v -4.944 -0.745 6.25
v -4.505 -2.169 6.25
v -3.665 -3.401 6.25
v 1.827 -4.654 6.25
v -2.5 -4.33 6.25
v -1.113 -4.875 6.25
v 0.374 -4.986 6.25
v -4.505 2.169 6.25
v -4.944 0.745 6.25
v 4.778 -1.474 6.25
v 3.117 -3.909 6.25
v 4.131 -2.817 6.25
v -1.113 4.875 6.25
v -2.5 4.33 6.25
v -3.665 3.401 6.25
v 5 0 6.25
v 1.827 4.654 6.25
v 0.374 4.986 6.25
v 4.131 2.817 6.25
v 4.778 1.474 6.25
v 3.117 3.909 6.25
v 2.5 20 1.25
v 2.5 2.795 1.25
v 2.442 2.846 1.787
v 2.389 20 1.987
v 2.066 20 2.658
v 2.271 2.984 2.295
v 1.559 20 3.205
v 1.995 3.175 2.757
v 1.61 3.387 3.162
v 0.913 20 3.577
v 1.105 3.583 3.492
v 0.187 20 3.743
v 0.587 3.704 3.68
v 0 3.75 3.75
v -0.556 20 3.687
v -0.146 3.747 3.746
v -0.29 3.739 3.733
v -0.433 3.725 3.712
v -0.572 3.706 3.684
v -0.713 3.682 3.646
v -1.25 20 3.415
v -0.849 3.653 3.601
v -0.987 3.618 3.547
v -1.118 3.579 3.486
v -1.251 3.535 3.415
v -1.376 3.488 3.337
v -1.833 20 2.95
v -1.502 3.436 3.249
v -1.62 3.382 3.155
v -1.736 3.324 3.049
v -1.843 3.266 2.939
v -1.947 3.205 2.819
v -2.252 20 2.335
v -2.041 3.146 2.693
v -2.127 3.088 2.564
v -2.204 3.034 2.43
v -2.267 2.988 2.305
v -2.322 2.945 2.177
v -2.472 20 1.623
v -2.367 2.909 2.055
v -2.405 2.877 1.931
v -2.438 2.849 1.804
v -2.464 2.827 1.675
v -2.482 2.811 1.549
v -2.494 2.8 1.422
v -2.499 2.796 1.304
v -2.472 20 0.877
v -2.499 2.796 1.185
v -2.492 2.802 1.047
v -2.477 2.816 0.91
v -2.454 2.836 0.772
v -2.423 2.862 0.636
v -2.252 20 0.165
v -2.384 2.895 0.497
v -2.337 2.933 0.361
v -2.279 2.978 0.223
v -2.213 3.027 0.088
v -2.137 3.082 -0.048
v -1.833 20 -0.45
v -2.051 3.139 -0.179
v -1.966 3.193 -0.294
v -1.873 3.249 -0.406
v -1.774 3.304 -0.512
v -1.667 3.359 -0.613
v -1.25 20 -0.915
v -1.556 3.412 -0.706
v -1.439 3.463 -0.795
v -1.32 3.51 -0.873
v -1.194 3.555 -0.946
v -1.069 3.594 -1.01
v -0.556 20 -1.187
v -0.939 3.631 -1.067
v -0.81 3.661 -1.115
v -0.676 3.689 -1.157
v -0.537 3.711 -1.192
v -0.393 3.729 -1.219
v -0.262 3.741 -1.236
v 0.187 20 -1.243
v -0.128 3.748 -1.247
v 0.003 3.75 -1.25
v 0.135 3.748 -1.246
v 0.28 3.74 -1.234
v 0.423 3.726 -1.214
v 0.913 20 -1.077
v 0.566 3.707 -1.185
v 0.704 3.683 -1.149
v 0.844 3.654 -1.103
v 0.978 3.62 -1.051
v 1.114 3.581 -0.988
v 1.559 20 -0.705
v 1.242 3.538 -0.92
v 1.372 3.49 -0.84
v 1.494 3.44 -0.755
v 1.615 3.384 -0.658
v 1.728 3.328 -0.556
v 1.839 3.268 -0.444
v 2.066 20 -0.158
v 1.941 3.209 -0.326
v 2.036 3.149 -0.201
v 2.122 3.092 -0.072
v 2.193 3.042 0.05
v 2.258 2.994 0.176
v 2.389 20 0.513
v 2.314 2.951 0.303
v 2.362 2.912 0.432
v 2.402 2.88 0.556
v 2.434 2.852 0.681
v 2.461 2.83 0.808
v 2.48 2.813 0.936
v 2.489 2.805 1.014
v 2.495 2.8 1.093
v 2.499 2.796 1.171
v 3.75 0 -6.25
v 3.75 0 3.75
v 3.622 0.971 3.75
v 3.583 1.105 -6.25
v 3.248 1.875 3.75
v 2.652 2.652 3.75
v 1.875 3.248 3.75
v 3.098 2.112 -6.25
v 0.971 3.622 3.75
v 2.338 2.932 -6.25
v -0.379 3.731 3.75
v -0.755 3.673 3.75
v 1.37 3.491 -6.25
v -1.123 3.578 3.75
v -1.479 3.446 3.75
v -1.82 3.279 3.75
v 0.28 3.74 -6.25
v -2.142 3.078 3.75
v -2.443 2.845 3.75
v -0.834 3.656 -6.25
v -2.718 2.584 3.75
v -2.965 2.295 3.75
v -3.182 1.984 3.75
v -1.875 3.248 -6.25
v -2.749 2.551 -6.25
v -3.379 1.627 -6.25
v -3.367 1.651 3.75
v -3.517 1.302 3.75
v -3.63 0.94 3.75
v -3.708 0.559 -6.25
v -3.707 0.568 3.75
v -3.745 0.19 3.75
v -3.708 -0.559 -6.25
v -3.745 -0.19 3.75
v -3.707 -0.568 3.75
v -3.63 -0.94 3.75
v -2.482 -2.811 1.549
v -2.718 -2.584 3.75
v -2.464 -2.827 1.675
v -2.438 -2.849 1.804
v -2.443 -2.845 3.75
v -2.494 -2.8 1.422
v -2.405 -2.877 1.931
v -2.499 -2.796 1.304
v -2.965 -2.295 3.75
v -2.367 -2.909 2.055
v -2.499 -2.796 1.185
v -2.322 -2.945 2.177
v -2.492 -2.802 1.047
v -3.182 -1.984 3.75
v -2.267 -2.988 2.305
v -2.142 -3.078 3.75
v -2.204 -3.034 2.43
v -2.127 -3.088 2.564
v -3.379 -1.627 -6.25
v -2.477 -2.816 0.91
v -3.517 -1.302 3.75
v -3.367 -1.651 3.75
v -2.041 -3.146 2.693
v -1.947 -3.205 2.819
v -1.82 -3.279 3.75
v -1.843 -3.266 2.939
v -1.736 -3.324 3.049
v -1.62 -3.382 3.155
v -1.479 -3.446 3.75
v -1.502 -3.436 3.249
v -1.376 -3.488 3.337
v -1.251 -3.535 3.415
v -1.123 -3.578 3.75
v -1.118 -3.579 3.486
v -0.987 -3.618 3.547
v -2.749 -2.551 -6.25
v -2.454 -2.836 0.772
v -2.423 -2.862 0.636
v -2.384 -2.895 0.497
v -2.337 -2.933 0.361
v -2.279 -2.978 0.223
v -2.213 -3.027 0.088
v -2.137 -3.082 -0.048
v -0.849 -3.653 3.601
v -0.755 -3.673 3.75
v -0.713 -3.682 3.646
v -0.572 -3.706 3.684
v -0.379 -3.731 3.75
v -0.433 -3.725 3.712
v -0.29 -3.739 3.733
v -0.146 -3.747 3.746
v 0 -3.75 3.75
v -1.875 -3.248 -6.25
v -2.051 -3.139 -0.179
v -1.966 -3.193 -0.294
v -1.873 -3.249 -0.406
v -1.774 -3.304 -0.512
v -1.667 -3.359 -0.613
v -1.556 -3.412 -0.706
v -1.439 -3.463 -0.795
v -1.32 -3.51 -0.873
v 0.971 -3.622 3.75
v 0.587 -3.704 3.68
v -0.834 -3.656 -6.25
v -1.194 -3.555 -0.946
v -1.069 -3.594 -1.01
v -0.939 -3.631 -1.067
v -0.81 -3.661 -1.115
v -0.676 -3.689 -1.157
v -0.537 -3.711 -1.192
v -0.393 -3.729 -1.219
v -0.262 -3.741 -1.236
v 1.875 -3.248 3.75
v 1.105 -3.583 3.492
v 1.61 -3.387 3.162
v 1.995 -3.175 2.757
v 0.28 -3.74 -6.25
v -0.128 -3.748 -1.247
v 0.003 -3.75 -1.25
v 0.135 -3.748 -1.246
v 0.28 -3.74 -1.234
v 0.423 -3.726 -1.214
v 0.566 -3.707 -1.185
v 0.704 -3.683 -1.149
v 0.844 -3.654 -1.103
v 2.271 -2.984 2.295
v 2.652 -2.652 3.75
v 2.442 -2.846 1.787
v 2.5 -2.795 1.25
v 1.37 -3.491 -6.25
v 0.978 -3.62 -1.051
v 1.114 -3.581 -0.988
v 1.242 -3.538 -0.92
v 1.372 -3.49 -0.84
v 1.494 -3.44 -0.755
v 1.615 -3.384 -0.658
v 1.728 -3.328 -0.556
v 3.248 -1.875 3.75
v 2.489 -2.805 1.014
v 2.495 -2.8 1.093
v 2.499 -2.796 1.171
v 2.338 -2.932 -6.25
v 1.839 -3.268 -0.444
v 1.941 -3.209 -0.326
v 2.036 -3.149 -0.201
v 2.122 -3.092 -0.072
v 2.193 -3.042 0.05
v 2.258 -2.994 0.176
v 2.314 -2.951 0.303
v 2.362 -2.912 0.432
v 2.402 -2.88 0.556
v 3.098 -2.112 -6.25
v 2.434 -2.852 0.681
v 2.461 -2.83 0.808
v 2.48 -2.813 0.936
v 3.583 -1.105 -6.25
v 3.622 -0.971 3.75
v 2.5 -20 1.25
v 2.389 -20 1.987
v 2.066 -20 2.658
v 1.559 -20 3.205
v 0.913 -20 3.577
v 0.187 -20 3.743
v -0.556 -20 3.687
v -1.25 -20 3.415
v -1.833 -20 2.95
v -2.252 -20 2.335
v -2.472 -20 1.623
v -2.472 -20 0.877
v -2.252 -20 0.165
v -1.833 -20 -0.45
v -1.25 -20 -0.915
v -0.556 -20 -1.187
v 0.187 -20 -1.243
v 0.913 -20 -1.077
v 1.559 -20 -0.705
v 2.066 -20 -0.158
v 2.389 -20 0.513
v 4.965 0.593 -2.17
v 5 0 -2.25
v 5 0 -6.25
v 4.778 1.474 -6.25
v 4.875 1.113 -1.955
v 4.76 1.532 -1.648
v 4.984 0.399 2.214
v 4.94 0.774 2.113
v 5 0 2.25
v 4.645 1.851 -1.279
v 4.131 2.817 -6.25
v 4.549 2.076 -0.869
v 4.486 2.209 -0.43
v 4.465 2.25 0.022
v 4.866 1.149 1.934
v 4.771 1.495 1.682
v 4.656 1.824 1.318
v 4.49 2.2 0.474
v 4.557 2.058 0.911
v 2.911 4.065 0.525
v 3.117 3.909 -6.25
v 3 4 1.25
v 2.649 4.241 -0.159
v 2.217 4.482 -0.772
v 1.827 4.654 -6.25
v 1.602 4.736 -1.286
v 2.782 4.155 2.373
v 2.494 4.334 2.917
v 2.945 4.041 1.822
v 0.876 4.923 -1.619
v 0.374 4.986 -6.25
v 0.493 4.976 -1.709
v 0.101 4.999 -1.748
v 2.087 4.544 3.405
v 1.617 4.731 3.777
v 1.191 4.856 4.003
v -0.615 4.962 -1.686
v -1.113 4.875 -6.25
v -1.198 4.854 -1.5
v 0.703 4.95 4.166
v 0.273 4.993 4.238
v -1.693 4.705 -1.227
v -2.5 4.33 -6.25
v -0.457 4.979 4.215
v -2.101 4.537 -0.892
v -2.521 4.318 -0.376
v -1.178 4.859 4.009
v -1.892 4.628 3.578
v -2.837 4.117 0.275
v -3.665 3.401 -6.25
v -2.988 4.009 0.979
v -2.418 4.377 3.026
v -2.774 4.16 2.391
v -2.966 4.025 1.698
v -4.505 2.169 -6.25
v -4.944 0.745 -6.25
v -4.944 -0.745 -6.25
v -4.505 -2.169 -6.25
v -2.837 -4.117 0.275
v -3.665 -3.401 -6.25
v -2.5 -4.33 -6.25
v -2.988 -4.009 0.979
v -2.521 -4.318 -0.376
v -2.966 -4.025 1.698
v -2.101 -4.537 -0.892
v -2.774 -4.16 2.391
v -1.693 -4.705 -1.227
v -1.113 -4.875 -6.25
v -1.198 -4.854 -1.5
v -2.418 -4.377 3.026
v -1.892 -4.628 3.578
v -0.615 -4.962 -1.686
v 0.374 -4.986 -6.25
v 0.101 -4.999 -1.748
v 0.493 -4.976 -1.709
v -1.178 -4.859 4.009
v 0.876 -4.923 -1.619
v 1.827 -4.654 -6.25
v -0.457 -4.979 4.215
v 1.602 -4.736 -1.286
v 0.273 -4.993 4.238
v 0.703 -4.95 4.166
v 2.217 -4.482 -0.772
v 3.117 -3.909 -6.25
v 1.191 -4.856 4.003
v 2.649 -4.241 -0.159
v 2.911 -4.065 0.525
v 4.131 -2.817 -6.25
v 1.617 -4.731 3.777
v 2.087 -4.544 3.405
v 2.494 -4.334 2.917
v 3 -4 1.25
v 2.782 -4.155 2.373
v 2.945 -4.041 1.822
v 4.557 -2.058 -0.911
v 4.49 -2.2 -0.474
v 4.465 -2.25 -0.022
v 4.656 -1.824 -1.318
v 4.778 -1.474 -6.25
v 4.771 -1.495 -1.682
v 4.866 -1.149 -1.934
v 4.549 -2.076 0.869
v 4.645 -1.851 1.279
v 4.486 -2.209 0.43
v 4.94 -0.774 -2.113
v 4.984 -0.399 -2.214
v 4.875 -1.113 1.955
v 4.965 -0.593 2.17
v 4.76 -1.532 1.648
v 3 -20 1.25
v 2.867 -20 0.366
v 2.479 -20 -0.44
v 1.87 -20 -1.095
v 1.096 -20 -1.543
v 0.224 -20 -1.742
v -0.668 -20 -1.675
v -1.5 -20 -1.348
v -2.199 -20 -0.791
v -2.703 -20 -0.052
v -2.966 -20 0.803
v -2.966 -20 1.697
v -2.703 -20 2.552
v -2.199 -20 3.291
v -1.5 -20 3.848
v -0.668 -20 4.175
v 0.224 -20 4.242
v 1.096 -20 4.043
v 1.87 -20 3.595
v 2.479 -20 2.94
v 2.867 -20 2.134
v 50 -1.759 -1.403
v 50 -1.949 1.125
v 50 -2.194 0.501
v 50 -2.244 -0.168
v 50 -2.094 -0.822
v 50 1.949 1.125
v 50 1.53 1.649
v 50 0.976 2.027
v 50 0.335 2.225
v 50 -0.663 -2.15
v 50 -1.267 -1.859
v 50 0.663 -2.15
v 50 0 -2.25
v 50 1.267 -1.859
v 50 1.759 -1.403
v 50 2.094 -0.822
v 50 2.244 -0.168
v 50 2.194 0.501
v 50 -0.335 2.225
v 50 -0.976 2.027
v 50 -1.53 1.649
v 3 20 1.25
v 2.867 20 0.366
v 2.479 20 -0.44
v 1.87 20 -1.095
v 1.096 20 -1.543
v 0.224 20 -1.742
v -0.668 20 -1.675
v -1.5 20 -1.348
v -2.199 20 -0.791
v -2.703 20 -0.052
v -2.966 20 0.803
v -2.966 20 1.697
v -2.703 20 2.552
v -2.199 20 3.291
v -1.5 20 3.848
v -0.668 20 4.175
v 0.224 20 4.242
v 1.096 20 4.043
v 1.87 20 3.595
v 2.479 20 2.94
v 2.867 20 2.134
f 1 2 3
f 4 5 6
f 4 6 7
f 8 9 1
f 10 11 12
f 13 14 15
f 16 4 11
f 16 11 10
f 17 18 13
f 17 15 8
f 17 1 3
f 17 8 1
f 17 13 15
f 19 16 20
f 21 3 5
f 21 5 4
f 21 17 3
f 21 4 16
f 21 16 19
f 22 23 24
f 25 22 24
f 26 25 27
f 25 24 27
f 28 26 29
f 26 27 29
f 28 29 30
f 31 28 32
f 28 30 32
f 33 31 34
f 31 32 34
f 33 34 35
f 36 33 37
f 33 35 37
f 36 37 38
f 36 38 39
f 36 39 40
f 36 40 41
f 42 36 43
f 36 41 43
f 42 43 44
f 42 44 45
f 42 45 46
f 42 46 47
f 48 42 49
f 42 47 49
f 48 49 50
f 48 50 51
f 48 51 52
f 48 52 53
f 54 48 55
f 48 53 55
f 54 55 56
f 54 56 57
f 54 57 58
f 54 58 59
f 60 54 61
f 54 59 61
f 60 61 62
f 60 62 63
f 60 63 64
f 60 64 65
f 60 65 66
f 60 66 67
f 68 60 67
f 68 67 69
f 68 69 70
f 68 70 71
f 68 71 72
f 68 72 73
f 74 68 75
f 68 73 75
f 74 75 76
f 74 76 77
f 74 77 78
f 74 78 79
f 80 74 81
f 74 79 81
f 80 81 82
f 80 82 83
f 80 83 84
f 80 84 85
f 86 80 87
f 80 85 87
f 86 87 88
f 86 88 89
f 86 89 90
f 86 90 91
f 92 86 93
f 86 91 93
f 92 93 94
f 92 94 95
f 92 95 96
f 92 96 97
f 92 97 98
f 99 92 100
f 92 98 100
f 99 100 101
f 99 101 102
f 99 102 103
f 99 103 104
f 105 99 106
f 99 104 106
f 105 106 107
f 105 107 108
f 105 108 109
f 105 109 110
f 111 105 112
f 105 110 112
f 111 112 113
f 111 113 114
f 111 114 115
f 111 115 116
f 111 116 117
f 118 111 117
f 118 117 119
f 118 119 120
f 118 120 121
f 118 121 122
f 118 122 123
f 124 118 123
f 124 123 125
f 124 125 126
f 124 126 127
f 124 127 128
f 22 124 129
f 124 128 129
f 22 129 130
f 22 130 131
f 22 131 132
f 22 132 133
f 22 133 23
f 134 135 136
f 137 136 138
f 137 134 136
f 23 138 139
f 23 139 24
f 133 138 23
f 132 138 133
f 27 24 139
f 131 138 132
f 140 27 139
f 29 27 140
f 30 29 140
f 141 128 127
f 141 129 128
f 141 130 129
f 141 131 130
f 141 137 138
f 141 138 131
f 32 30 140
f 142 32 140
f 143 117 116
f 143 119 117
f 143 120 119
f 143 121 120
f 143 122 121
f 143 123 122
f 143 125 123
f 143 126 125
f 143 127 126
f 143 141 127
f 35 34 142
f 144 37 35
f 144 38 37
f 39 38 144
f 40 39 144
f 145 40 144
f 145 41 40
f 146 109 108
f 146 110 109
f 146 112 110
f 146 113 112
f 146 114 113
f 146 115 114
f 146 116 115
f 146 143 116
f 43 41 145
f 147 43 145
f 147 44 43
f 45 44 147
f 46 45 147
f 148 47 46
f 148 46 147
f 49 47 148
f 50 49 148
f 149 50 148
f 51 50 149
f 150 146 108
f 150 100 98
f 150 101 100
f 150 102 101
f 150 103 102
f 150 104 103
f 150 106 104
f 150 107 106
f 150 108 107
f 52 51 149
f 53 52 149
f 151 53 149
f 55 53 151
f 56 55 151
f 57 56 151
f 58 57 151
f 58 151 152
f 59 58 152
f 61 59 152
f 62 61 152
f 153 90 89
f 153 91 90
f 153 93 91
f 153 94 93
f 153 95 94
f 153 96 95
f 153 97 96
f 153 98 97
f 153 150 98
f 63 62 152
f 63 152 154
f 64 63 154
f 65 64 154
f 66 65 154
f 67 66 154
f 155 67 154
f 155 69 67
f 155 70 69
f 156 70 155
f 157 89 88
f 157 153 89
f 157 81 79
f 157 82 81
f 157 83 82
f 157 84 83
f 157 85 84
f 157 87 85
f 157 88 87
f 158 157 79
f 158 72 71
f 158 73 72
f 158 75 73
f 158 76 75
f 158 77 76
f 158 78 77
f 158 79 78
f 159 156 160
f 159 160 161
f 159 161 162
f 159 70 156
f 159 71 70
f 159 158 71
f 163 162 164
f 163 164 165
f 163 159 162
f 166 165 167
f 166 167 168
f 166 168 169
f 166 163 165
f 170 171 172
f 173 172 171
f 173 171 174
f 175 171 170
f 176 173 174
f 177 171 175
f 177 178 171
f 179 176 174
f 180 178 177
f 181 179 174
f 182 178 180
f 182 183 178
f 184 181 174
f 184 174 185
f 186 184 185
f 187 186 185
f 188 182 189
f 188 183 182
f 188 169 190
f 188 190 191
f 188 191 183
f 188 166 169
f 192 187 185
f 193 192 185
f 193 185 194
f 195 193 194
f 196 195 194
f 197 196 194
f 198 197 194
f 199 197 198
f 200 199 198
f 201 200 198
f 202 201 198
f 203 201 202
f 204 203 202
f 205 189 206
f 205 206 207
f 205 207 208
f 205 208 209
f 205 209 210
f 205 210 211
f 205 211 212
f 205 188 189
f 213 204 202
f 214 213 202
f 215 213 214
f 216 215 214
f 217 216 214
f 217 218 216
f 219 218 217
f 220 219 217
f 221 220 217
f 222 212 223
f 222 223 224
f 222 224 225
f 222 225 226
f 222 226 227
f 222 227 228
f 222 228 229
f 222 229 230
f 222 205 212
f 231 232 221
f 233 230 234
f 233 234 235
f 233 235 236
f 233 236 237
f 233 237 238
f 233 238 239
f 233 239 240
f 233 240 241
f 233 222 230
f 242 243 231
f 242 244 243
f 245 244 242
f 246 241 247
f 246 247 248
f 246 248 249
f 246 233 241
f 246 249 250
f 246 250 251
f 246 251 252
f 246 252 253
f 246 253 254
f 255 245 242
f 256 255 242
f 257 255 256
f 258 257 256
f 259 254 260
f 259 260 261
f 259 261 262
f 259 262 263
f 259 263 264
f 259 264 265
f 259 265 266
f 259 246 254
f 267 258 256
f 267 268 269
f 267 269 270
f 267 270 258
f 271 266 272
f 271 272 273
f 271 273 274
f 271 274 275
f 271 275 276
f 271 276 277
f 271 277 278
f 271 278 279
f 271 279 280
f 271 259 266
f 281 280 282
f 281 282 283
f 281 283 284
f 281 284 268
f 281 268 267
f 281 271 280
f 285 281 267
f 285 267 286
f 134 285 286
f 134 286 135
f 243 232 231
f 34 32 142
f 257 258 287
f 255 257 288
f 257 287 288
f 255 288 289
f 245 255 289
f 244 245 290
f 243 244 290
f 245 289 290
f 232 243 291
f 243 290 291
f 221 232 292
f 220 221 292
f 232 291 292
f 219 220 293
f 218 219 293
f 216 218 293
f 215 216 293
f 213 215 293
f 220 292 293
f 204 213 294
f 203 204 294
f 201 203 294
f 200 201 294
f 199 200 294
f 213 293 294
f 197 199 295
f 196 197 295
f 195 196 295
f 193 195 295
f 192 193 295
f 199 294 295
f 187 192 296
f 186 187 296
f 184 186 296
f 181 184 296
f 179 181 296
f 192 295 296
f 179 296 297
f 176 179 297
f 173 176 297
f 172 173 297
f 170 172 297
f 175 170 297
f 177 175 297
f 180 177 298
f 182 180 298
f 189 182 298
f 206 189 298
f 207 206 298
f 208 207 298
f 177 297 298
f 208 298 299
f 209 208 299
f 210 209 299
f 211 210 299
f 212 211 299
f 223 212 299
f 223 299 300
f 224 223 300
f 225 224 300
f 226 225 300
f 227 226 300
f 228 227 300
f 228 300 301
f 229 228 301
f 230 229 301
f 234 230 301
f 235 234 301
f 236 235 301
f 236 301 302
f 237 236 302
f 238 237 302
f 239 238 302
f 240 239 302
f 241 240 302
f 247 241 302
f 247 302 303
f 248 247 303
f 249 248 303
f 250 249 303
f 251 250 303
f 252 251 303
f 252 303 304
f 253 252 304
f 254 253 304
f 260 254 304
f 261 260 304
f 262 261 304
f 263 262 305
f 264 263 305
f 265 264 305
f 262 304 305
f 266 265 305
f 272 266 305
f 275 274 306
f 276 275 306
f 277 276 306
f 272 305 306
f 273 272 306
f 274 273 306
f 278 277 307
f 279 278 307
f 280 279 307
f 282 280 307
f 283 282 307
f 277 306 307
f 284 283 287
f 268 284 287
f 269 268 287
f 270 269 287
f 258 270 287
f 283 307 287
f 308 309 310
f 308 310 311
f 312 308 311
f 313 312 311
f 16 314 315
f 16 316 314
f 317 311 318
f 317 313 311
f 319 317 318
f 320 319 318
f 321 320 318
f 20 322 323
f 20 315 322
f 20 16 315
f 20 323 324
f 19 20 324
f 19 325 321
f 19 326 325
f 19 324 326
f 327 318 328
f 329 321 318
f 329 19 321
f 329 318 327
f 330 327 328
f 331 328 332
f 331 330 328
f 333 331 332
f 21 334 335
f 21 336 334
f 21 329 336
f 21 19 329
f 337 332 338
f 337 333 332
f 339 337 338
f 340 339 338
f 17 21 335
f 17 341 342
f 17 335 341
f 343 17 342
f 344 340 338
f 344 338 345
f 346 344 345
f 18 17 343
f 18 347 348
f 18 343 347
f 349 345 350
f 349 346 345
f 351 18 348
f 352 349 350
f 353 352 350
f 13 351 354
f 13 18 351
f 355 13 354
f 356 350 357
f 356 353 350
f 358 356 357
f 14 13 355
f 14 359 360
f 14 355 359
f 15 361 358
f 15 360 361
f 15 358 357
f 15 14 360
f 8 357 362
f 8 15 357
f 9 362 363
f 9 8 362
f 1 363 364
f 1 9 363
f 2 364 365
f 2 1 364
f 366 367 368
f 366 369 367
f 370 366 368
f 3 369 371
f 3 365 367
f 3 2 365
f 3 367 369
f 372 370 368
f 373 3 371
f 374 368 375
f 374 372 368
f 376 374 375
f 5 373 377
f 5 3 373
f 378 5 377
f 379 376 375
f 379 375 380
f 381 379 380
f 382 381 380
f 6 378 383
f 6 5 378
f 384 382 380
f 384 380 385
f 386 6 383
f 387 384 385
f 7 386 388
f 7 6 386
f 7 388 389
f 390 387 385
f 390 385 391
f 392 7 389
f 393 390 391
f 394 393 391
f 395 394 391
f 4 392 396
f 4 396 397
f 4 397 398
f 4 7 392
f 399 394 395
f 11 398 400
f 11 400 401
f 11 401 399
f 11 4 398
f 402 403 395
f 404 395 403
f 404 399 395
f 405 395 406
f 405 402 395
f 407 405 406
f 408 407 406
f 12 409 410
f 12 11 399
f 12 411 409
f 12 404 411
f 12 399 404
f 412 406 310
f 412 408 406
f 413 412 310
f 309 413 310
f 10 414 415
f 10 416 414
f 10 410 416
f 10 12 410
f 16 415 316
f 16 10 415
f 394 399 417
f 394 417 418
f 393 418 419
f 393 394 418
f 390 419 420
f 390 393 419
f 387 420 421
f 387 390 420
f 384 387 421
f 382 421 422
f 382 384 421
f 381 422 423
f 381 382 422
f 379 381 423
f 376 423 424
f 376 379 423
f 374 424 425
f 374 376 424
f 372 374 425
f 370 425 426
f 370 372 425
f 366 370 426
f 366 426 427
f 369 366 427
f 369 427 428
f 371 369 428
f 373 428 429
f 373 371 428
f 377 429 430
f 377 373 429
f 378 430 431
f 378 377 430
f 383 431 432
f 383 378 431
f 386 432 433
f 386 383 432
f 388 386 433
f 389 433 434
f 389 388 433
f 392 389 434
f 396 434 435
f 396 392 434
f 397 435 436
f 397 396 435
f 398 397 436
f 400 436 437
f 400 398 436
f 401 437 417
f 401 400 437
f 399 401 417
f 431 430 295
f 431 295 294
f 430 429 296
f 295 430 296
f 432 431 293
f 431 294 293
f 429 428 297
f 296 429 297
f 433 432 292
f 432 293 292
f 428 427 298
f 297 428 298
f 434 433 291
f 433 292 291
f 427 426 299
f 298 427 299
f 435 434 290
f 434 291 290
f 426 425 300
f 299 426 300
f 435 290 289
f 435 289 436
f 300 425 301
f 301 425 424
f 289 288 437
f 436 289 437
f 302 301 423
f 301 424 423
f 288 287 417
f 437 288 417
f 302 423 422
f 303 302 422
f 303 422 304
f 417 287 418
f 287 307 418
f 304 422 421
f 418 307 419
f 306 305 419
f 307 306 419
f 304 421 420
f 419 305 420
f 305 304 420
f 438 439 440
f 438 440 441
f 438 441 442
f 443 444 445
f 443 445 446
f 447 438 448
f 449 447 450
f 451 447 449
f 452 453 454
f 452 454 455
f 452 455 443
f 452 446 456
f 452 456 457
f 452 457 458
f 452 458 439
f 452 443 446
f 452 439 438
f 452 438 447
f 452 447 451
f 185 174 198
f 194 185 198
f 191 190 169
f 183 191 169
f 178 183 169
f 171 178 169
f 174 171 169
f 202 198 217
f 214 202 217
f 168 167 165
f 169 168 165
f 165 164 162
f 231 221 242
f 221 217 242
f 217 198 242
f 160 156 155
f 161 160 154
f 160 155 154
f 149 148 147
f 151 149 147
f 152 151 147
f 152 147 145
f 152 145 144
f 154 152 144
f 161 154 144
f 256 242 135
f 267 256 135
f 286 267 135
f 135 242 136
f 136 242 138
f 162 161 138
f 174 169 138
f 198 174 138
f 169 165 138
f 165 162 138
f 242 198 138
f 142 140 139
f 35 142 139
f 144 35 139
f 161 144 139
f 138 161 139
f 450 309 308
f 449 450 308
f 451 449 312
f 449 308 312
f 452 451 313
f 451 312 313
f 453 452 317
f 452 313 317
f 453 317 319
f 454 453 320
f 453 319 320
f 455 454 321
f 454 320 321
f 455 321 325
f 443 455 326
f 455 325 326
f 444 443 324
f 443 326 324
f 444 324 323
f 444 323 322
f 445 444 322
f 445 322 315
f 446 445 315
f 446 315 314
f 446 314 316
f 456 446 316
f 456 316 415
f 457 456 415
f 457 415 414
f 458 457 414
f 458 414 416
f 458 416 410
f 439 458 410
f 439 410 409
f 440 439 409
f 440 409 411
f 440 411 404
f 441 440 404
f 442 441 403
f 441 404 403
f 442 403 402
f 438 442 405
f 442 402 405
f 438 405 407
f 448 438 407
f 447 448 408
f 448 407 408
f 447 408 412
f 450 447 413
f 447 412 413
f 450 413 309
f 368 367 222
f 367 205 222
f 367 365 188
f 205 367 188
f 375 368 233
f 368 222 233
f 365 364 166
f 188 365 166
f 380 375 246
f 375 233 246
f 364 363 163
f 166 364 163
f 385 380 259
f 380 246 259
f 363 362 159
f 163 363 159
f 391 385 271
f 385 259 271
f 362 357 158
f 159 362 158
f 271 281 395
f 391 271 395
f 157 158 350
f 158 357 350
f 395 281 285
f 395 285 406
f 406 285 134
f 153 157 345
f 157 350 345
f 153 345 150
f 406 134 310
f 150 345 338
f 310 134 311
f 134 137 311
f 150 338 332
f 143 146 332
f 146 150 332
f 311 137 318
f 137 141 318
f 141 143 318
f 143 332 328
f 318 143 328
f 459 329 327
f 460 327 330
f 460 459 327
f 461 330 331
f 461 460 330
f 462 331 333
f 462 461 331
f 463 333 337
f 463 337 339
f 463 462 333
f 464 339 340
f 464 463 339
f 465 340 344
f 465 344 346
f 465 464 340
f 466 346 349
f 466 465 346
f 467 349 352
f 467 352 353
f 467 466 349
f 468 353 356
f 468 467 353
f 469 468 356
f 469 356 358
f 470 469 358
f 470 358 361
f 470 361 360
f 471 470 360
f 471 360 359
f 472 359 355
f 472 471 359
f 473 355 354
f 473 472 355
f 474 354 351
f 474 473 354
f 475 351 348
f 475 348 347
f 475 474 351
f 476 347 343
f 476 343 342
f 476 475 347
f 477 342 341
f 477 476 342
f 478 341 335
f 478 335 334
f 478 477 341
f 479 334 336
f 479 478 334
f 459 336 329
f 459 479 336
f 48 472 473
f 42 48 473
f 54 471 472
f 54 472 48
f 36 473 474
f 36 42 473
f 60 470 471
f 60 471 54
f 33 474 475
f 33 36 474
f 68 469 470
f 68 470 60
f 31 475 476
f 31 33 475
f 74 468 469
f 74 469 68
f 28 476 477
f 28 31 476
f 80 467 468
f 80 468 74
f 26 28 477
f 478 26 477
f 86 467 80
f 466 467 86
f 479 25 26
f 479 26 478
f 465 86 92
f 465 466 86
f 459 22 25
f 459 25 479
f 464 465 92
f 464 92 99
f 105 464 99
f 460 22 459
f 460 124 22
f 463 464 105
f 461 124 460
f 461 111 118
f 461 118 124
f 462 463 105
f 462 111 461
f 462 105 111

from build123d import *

# Parameters (mm, degrees)
SKETCH1_R           = 5
BOSS_EXTRUDE1_DEPTH = 6.25
SKETCH2_R           = 3
BOSS_EXTRUDE2_DEPTH = 20
SKETCH3_R           = 2.25
BOSS_EXTRUDE3_DEPTH = 50
SKETCH4_R           = 2.5
CUT_EXTRUDE1_DEPTH  = 40
CUT_EXTRUDE2_START  = -12.5
SKETCH5_R           = 3.75
CUT_EXTRUDE2_DEPTH  = 10


with BuildPart() as part:
    # Sketch1 → Boss-Extrude1 (new body, symmetric)
    with BuildSketch(Plane.XY):
        Circle(SKETCH1_R)
    extrude(amount=BOSS_EXTRUDE1_DEPTH, both=True)

    # Sketch2 → Boss-Extrude2 (add, symmetric)
    with BuildSketch(Plane(origin=(0, 0, 0), x_dir=(1, 0, 0), z_dir=(0, 1, 0))):
        with Locations((0, -1.25)):
            Circle(SKETCH2_R)
    extrude(amount=BOSS_EXTRUDE2_DEPTH, both=True)

    # Sketch3 → Boss-Extrude3 (add)
    with BuildSketch(Plane(origin=(0, 0, 0), x_dir=(0, 0, -1), z_dir=(1, 0, 0))):
        Circle(SKETCH3_R)
    extrude(amount=BOSS_EXTRUDE3_DEPTH)

    # Sketch4 → Cut-Extrude1 (cut)
    with BuildSketch(Plane.XZ.offset(20)):
        with Locations((0, 1.25)):
            Circle(SKETCH4_R)
    extrude(amount=-CUT_EXTRUDE1_DEPTH, mode=Mode.SUBTRACT)

    # Sketch5 → Cut-Extrude2 (cut)
    with BuildSketch(Plane.XY.offset(6.25).offset(CUT_EXTRUDE2_START)):
        Circle(SKETCH5_R)
    extrude(amount=CUT_EXTRUDE2_DEPTH, mode=Mode.SUBTRACT)


solid = part.part
